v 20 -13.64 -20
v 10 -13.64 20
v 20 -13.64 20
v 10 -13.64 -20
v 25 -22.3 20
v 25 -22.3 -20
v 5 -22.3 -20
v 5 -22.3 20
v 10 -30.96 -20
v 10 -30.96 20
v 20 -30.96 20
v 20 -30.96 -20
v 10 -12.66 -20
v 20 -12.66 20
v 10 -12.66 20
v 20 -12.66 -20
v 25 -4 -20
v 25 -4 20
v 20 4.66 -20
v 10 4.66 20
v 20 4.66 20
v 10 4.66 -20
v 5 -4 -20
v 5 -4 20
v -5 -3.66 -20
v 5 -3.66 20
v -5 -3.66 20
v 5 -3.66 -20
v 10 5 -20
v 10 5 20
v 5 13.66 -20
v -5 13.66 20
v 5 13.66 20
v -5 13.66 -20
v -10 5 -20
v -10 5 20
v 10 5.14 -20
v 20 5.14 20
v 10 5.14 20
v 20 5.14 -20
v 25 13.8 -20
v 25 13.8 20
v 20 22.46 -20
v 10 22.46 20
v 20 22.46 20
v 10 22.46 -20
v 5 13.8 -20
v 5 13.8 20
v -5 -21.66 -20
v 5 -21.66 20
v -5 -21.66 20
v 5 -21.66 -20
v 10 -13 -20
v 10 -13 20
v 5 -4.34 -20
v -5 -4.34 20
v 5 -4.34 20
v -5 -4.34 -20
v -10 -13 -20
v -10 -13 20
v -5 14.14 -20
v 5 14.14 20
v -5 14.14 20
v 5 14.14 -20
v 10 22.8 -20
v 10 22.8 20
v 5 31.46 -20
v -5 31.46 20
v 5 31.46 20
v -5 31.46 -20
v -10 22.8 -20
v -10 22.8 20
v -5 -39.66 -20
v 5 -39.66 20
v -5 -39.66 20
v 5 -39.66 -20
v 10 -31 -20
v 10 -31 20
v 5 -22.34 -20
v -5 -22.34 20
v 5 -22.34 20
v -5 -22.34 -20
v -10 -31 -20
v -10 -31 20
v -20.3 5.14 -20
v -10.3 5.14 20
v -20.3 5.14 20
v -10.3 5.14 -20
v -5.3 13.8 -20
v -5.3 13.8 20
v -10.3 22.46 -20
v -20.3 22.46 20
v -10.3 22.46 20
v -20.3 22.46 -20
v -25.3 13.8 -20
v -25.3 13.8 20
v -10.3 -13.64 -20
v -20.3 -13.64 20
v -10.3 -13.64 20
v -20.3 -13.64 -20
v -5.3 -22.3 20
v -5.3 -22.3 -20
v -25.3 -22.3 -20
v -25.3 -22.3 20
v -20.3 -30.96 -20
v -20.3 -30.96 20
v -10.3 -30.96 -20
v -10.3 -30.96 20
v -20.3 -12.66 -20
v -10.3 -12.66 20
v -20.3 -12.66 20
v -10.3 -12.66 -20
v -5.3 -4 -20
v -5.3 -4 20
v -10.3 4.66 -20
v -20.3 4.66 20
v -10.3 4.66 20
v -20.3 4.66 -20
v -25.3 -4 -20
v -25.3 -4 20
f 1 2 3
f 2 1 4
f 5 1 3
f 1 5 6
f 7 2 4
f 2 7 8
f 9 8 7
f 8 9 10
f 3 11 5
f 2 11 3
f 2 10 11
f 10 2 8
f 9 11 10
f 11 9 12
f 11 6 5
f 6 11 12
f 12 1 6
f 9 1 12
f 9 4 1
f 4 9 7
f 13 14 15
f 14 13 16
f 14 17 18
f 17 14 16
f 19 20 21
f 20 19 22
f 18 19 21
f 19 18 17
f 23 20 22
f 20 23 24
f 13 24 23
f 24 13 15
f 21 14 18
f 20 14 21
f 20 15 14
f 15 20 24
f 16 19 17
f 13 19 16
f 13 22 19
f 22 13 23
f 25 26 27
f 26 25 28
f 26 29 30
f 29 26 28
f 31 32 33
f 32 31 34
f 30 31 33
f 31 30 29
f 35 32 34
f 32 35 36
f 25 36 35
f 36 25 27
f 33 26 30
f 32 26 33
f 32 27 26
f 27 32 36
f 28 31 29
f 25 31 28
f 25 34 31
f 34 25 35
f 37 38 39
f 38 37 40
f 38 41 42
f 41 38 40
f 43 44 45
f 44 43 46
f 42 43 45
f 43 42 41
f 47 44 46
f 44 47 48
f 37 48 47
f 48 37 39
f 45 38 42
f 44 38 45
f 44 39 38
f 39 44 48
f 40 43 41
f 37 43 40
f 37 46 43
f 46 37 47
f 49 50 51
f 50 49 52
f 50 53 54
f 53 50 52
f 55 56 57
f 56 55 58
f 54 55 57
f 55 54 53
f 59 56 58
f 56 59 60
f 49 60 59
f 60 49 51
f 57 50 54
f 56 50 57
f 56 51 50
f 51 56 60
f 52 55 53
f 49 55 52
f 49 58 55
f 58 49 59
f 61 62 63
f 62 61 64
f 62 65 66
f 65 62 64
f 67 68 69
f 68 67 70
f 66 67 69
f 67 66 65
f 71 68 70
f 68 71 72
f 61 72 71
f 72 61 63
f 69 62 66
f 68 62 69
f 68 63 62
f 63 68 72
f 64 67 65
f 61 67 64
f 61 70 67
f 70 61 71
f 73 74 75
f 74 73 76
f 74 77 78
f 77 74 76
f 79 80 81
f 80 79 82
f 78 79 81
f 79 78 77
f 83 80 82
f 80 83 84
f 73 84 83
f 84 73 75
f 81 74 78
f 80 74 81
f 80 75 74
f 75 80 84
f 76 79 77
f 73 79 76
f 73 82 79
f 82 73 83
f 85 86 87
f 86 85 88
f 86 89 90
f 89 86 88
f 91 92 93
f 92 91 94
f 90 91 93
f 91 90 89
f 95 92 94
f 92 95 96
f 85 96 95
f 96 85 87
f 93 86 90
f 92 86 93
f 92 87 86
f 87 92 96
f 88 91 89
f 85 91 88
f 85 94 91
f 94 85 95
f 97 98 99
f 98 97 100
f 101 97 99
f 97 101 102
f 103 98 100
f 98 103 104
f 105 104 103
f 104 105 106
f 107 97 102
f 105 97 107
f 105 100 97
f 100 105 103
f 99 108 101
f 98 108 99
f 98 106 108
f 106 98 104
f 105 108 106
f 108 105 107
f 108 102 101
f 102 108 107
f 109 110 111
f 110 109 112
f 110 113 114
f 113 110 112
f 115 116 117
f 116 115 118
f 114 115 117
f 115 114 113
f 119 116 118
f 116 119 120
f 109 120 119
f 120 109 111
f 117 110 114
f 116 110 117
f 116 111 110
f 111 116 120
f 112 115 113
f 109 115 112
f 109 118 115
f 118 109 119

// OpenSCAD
//Jessica Kang
module move(x=0,y=0,z=0,rx=0,ry=0,rz=0)
{ translate([x,y,z])rotate([rx,ry,rz]) children(); }
   
move(x=15, y=-22.3)           cylinder(h=40, r=10, center=true); $fn = 6;

move(x=15, y=-4)          cylinder(h=40, r=10, center=true); $fn = 6;

move(y=5, ry=0)cylinder(h=40, r=10, center=true); $fn = 6;

module move(x=0,y=0,z=0,rx=0,ry=0,rz=0)
{ translate([x,y,z])rotate([rx,ry,rz]) children(); }
   
move(x=15, y=13.8)           cylinder(h=40, r=10, center=true); $fn = 6;
move(y=-13)          cylinder(h=40, r=10, center=true); $fn = 6;
move(y=22.8, ry=0)cylinder(h=40, r=10, center=true); $fn = 6;
move(y=-31,ry=0)cylinder(h=40, r=10, center=true); $fn = 6;

module move(x=0,y=0,z=0,rx=0,ry=0,rz=0)
{ translate([x,y,z])rotate([rx,ry,rz]) children(); }
   
move(x=-15.3, y=13.8)           cylinder(h=40, r=10, center=true); $fn = 6;
move(x=-15.3, y=-22.3)          cylinder(h=40, r=10, center=true); $fn = 6;
move(x=-15.3, y=-4)cylinder(h=40, r=10, center=true); $fn = 6;
